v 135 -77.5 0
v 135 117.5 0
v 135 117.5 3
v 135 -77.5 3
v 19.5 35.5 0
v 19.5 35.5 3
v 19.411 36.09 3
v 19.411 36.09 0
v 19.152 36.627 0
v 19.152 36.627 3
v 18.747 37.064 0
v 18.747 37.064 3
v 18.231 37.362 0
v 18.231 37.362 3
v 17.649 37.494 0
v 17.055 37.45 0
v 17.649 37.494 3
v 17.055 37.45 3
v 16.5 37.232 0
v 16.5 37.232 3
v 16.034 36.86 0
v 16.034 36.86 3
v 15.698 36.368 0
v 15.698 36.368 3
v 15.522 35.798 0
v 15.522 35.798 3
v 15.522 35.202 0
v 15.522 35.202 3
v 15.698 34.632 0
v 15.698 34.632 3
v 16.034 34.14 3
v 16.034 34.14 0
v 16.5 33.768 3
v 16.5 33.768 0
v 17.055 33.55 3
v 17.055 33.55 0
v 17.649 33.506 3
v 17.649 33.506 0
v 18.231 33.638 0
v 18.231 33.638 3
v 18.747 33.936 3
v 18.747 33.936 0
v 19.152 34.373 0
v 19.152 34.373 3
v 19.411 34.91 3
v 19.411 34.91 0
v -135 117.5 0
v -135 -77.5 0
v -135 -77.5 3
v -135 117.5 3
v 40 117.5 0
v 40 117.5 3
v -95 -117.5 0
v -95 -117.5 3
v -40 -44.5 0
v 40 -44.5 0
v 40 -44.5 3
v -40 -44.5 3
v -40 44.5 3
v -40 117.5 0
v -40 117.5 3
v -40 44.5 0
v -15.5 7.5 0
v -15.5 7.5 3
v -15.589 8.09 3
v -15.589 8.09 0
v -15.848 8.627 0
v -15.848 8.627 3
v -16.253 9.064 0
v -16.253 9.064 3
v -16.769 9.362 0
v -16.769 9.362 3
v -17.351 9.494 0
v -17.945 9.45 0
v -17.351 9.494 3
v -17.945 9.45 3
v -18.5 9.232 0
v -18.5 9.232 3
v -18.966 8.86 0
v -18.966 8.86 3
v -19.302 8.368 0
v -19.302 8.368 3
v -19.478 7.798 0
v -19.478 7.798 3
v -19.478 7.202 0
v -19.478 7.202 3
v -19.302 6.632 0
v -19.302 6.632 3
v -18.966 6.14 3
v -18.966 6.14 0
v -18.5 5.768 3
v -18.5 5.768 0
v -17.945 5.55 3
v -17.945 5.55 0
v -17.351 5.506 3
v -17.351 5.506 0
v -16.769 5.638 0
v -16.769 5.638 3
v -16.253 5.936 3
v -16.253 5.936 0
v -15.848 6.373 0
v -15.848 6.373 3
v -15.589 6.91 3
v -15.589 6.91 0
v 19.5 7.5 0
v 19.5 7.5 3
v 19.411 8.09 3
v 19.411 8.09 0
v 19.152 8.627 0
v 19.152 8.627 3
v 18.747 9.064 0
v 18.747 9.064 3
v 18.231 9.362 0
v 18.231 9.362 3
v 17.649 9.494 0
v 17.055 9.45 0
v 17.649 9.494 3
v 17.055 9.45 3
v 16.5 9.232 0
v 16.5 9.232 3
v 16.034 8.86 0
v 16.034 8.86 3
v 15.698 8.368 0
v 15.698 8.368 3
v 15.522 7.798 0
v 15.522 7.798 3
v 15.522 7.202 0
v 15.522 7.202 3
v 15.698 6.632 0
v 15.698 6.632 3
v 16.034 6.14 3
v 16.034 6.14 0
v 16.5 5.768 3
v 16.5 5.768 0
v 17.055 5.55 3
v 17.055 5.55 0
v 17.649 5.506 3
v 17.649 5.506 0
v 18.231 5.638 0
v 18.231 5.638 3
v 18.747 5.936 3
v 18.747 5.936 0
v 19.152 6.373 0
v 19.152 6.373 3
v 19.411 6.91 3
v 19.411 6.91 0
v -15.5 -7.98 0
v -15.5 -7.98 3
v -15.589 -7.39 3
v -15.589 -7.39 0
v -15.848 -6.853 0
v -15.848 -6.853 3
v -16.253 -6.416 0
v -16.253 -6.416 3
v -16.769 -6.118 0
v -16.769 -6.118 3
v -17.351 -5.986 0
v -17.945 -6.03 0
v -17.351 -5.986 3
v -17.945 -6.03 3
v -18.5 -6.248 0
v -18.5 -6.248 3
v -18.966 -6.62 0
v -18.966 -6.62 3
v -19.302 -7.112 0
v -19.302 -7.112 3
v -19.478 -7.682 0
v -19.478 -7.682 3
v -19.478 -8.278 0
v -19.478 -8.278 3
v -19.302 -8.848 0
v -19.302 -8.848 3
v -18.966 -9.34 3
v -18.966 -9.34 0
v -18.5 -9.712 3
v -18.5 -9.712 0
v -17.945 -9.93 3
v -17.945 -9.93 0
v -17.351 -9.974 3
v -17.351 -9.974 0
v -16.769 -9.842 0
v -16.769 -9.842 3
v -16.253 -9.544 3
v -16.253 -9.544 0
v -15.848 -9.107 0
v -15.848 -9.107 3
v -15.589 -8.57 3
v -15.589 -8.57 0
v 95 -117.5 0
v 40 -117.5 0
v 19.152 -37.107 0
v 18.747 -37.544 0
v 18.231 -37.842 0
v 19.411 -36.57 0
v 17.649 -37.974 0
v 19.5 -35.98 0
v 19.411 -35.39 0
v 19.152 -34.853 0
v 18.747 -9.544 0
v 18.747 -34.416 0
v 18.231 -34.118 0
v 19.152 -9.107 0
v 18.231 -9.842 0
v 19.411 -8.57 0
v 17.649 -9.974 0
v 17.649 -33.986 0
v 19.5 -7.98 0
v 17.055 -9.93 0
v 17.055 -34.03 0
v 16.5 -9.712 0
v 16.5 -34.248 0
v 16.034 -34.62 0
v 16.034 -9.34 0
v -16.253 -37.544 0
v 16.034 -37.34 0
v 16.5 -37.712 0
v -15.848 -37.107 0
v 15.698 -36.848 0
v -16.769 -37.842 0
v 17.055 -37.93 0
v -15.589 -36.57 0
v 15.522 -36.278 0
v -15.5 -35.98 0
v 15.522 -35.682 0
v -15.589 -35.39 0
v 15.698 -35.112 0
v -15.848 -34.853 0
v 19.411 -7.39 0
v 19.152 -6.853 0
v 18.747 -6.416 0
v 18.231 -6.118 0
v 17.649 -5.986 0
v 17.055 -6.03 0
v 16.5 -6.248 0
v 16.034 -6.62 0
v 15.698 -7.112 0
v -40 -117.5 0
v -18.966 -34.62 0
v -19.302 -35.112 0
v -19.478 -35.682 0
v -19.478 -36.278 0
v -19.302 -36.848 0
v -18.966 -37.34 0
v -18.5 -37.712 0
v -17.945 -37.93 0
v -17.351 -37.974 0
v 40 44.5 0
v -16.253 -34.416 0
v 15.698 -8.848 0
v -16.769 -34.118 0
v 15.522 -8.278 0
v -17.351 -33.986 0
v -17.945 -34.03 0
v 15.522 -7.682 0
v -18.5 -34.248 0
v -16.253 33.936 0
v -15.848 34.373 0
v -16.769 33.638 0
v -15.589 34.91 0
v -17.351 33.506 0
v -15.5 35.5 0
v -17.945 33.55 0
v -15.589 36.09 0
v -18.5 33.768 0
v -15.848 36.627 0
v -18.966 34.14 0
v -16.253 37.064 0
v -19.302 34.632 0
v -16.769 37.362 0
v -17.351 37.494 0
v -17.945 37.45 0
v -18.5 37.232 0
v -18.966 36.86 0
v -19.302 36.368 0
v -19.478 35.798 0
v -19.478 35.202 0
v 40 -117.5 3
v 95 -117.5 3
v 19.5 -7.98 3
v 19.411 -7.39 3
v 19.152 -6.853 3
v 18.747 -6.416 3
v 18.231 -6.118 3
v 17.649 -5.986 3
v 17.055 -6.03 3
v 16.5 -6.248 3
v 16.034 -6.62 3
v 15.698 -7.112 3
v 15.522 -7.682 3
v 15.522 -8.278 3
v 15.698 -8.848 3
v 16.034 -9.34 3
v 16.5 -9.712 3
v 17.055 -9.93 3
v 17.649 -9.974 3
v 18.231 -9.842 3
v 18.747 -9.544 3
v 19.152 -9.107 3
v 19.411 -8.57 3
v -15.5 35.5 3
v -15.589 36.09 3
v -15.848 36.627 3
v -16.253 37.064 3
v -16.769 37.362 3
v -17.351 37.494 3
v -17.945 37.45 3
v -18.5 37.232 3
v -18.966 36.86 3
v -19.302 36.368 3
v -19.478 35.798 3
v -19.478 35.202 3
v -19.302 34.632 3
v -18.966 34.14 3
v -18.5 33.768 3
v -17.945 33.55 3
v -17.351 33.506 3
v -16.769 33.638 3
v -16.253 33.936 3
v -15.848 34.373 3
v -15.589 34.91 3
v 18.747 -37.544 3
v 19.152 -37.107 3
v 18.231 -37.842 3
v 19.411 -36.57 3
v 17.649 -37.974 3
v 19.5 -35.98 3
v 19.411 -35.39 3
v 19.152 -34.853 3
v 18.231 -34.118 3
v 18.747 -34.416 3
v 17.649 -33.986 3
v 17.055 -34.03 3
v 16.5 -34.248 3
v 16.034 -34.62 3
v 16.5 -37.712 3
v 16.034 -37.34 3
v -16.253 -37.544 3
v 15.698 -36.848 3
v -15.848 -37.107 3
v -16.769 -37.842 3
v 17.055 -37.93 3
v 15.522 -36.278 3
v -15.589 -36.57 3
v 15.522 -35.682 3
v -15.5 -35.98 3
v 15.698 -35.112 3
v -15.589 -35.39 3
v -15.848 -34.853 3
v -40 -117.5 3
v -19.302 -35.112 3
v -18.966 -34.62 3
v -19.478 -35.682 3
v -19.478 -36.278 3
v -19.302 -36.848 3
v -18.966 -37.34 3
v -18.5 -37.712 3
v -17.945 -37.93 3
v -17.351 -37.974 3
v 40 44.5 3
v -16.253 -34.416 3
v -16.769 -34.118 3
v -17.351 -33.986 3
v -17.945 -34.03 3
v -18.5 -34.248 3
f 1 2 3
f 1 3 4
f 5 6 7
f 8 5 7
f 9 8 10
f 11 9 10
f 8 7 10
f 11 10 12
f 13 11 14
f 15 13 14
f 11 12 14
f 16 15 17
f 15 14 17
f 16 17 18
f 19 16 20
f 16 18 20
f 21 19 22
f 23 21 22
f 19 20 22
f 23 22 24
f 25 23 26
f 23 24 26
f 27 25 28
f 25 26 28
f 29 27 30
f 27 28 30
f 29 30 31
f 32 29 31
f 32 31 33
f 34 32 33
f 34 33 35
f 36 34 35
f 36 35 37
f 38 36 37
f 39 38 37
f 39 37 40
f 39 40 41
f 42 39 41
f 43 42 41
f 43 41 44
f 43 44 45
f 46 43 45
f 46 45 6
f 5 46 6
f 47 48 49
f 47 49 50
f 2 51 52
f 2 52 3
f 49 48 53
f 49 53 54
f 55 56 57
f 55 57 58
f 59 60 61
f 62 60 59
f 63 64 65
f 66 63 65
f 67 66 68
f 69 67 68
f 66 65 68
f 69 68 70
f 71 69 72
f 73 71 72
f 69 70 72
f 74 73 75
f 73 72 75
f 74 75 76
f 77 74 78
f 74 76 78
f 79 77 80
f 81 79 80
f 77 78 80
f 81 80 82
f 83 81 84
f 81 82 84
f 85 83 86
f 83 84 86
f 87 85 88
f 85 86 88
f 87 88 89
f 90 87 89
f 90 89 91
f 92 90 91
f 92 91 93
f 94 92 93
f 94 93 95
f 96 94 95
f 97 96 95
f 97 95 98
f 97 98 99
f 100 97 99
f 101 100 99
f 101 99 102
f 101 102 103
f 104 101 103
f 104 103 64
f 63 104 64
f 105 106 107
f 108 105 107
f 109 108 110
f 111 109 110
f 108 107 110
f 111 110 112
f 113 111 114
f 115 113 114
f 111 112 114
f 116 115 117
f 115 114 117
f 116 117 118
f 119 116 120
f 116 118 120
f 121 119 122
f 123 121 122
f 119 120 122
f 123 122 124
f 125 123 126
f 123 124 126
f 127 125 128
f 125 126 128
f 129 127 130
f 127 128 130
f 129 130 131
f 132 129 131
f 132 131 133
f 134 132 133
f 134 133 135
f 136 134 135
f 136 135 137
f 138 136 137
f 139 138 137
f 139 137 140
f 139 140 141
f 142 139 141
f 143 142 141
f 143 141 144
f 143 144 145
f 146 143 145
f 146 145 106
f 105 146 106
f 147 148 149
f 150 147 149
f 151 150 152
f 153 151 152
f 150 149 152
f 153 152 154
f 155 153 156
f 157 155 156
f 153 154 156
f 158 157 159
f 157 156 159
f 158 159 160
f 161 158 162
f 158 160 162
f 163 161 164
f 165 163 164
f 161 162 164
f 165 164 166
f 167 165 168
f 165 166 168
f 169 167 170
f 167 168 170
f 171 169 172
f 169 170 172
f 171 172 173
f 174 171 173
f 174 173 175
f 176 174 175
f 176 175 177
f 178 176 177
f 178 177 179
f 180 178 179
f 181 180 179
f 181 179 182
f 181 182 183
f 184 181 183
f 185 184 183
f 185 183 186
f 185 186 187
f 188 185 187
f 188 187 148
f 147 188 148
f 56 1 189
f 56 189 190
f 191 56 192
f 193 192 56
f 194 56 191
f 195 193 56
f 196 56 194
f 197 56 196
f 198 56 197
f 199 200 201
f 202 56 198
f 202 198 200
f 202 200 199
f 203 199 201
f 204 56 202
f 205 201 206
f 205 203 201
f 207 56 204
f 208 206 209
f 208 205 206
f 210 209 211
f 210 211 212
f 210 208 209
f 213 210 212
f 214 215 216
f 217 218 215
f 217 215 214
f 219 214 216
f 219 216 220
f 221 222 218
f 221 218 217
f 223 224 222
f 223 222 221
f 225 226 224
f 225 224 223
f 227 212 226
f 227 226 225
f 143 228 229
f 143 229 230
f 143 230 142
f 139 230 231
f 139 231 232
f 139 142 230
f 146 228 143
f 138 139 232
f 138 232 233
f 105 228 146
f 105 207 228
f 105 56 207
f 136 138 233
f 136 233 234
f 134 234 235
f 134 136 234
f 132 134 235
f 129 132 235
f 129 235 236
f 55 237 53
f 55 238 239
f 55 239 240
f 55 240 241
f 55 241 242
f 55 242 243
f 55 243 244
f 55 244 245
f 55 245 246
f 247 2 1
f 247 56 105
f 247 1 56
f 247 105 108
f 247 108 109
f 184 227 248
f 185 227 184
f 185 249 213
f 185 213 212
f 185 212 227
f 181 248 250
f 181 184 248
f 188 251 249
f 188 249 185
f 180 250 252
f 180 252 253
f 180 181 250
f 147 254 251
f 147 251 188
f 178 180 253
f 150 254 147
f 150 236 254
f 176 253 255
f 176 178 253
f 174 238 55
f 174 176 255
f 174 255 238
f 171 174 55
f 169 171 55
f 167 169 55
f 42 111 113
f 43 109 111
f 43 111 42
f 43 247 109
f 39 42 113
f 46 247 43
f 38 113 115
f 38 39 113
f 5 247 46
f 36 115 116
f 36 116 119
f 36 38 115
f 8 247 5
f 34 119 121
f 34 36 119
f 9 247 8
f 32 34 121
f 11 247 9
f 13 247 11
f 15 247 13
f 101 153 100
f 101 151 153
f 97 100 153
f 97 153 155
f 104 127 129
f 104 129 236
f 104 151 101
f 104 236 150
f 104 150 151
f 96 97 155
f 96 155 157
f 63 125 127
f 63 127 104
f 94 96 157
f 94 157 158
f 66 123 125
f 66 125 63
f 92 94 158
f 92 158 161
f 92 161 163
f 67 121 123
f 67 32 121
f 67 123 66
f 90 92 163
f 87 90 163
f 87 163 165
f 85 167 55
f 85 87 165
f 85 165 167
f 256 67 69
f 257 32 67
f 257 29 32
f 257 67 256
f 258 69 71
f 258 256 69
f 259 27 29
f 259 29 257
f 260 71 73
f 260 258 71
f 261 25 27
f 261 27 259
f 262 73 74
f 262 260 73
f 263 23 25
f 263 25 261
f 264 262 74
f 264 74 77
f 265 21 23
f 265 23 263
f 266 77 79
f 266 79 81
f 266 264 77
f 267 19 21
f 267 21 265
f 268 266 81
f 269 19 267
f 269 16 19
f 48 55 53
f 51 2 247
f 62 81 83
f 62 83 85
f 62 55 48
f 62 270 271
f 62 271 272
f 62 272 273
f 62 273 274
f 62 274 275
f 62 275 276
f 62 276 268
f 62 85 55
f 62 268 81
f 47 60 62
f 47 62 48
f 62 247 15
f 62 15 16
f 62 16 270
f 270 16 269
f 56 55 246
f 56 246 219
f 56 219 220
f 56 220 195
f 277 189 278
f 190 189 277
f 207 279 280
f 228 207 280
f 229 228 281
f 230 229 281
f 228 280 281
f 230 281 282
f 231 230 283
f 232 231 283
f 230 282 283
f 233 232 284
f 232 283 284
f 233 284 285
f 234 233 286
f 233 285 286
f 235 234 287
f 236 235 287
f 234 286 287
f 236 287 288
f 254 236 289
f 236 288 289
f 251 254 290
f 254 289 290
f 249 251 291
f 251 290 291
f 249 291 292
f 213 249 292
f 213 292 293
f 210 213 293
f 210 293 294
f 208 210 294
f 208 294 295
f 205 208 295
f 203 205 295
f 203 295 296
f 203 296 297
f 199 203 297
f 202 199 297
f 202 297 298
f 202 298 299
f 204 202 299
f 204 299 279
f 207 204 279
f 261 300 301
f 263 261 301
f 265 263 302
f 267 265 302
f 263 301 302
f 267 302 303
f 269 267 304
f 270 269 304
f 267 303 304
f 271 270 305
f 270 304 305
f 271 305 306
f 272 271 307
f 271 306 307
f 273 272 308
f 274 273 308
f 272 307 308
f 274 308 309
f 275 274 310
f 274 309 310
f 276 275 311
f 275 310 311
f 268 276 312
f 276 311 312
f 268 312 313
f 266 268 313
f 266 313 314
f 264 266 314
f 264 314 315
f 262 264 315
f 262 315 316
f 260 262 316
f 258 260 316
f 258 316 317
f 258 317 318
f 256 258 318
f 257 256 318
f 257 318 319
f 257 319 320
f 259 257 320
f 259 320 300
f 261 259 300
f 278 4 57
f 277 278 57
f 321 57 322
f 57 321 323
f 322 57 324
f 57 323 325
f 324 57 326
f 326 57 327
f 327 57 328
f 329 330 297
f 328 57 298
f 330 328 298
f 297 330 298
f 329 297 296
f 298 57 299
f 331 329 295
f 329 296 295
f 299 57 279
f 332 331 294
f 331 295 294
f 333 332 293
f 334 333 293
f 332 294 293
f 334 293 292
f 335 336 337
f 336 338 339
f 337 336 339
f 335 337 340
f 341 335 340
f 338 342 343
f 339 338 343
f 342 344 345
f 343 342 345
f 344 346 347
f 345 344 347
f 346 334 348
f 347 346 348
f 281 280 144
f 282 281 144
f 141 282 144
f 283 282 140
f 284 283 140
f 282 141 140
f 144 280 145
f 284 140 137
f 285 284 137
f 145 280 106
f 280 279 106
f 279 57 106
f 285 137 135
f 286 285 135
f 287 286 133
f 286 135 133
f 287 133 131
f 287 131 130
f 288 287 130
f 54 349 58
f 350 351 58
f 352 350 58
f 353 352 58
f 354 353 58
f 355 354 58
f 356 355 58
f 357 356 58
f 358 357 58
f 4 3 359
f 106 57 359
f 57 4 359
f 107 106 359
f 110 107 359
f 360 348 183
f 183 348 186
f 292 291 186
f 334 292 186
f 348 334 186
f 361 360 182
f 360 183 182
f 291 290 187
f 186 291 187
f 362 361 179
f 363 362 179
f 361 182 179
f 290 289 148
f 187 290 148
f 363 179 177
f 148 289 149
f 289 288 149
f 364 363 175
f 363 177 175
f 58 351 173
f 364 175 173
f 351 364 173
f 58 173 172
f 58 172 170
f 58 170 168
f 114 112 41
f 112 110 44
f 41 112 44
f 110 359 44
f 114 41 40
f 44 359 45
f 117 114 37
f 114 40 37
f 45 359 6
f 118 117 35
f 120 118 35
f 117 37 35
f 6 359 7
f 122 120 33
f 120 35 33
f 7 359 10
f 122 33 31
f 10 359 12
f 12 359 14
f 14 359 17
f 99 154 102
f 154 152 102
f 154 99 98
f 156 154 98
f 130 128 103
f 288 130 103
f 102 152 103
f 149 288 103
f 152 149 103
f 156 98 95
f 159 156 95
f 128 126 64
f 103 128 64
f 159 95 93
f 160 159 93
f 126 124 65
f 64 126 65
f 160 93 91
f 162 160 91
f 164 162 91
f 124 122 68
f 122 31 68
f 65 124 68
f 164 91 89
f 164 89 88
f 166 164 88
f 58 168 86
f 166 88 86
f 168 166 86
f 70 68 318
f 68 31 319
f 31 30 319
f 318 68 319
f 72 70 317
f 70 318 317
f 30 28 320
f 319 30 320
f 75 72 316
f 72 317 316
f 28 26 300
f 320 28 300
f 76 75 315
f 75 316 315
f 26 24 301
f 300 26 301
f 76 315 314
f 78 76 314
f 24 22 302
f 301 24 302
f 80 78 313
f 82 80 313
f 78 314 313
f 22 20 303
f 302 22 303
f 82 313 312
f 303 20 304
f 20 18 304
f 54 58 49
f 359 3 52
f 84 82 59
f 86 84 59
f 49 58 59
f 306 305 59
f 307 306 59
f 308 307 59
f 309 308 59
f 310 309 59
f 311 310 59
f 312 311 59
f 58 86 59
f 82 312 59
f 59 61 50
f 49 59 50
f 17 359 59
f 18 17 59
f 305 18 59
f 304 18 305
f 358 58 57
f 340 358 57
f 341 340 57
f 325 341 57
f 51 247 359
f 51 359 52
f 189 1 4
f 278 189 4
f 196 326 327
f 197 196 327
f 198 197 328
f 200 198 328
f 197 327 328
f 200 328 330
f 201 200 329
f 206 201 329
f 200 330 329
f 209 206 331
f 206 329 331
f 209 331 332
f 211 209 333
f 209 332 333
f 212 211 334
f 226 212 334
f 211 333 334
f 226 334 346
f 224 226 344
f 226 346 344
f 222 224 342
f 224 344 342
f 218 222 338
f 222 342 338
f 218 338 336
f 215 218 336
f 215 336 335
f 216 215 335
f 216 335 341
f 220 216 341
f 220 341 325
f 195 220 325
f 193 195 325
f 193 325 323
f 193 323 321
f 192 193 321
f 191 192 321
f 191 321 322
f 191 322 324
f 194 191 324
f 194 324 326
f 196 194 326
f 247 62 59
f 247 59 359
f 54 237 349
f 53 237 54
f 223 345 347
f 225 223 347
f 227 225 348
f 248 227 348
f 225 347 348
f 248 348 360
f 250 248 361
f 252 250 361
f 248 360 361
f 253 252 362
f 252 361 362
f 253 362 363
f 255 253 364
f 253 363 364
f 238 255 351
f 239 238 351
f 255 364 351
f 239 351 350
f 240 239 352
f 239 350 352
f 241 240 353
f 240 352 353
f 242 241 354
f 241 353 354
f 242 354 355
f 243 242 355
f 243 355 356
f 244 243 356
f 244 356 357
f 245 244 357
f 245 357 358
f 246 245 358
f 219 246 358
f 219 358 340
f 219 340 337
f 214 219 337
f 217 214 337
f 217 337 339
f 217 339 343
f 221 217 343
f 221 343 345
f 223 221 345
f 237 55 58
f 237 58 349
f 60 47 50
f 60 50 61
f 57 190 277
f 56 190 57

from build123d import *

# Parameters (mm, degrees)
BOSS_EXTRU_1_DEPTH      = 3
ESQUISSE2_R             = 2
ENL_V_MAT_EXTRU_1_DEPTH = 179.997905016
CHANFREIN1_SIZE         = 40


with BuildPart() as part:
    # Esquisse1 → Boss.-Extru.1 (new body)
    with BuildSketch(Plane.XY):
        Polygon((-40, 117.5), (-40, 44.5), (40, 44.5), (40, 117.5), (135, 117.5), (135, -117.5), (40, -117.5), (40, -44.5), (-40, -44.5), (-40, -117.5), (-135, -117.5), (-135, 117.5), align=None)
    extrude(amount=BOSS_EXTRU_1_DEPTH)

    # Esquisse2 → Enlèv. mat.-Extru.1 (cut, through all)
    with BuildSketch(Plane.XY.offset(3)):
        with Locations((-17.5, -35.98)):
            Circle(ESQUISSE2_R)
        with Locations((17.5, -35.98)):
            Circle(ESQUISSE2_R)
        with Locations((-17.5, -7.98)):
            Circle(ESQUISSE2_R)
        with Locations((-17.5, 7.5)):
            Circle(ESQUISSE2_R)
        with Locations((17.5, 7.5)):
            Circle(ESQUISSE2_R)
        with Locations((17.5, -7.98)):
            Circle(ESQUISSE2_R)
        with Locations((-17.5, 35.5)):
            Circle(ESQUISSE2_R)
        with Locations((17.5, 35.5)):
            Circle(ESQUISSE2_R)
    extrude(amount=-ENL_V_MAT_EXTRU_1_DEPTH, mode=Mode.SUBTRACT)

    # Chanfrein1
    chanfrein1_edges = [part.edges().sort_by_distance(p)[0] for p in [
        (135, -117.5, 1.5),
        (-135, -117.5, 1.5),
    ]]
    chamfer(chanfrein1_edges, length=CHANFREIN1_SIZE)


solid = part.part
